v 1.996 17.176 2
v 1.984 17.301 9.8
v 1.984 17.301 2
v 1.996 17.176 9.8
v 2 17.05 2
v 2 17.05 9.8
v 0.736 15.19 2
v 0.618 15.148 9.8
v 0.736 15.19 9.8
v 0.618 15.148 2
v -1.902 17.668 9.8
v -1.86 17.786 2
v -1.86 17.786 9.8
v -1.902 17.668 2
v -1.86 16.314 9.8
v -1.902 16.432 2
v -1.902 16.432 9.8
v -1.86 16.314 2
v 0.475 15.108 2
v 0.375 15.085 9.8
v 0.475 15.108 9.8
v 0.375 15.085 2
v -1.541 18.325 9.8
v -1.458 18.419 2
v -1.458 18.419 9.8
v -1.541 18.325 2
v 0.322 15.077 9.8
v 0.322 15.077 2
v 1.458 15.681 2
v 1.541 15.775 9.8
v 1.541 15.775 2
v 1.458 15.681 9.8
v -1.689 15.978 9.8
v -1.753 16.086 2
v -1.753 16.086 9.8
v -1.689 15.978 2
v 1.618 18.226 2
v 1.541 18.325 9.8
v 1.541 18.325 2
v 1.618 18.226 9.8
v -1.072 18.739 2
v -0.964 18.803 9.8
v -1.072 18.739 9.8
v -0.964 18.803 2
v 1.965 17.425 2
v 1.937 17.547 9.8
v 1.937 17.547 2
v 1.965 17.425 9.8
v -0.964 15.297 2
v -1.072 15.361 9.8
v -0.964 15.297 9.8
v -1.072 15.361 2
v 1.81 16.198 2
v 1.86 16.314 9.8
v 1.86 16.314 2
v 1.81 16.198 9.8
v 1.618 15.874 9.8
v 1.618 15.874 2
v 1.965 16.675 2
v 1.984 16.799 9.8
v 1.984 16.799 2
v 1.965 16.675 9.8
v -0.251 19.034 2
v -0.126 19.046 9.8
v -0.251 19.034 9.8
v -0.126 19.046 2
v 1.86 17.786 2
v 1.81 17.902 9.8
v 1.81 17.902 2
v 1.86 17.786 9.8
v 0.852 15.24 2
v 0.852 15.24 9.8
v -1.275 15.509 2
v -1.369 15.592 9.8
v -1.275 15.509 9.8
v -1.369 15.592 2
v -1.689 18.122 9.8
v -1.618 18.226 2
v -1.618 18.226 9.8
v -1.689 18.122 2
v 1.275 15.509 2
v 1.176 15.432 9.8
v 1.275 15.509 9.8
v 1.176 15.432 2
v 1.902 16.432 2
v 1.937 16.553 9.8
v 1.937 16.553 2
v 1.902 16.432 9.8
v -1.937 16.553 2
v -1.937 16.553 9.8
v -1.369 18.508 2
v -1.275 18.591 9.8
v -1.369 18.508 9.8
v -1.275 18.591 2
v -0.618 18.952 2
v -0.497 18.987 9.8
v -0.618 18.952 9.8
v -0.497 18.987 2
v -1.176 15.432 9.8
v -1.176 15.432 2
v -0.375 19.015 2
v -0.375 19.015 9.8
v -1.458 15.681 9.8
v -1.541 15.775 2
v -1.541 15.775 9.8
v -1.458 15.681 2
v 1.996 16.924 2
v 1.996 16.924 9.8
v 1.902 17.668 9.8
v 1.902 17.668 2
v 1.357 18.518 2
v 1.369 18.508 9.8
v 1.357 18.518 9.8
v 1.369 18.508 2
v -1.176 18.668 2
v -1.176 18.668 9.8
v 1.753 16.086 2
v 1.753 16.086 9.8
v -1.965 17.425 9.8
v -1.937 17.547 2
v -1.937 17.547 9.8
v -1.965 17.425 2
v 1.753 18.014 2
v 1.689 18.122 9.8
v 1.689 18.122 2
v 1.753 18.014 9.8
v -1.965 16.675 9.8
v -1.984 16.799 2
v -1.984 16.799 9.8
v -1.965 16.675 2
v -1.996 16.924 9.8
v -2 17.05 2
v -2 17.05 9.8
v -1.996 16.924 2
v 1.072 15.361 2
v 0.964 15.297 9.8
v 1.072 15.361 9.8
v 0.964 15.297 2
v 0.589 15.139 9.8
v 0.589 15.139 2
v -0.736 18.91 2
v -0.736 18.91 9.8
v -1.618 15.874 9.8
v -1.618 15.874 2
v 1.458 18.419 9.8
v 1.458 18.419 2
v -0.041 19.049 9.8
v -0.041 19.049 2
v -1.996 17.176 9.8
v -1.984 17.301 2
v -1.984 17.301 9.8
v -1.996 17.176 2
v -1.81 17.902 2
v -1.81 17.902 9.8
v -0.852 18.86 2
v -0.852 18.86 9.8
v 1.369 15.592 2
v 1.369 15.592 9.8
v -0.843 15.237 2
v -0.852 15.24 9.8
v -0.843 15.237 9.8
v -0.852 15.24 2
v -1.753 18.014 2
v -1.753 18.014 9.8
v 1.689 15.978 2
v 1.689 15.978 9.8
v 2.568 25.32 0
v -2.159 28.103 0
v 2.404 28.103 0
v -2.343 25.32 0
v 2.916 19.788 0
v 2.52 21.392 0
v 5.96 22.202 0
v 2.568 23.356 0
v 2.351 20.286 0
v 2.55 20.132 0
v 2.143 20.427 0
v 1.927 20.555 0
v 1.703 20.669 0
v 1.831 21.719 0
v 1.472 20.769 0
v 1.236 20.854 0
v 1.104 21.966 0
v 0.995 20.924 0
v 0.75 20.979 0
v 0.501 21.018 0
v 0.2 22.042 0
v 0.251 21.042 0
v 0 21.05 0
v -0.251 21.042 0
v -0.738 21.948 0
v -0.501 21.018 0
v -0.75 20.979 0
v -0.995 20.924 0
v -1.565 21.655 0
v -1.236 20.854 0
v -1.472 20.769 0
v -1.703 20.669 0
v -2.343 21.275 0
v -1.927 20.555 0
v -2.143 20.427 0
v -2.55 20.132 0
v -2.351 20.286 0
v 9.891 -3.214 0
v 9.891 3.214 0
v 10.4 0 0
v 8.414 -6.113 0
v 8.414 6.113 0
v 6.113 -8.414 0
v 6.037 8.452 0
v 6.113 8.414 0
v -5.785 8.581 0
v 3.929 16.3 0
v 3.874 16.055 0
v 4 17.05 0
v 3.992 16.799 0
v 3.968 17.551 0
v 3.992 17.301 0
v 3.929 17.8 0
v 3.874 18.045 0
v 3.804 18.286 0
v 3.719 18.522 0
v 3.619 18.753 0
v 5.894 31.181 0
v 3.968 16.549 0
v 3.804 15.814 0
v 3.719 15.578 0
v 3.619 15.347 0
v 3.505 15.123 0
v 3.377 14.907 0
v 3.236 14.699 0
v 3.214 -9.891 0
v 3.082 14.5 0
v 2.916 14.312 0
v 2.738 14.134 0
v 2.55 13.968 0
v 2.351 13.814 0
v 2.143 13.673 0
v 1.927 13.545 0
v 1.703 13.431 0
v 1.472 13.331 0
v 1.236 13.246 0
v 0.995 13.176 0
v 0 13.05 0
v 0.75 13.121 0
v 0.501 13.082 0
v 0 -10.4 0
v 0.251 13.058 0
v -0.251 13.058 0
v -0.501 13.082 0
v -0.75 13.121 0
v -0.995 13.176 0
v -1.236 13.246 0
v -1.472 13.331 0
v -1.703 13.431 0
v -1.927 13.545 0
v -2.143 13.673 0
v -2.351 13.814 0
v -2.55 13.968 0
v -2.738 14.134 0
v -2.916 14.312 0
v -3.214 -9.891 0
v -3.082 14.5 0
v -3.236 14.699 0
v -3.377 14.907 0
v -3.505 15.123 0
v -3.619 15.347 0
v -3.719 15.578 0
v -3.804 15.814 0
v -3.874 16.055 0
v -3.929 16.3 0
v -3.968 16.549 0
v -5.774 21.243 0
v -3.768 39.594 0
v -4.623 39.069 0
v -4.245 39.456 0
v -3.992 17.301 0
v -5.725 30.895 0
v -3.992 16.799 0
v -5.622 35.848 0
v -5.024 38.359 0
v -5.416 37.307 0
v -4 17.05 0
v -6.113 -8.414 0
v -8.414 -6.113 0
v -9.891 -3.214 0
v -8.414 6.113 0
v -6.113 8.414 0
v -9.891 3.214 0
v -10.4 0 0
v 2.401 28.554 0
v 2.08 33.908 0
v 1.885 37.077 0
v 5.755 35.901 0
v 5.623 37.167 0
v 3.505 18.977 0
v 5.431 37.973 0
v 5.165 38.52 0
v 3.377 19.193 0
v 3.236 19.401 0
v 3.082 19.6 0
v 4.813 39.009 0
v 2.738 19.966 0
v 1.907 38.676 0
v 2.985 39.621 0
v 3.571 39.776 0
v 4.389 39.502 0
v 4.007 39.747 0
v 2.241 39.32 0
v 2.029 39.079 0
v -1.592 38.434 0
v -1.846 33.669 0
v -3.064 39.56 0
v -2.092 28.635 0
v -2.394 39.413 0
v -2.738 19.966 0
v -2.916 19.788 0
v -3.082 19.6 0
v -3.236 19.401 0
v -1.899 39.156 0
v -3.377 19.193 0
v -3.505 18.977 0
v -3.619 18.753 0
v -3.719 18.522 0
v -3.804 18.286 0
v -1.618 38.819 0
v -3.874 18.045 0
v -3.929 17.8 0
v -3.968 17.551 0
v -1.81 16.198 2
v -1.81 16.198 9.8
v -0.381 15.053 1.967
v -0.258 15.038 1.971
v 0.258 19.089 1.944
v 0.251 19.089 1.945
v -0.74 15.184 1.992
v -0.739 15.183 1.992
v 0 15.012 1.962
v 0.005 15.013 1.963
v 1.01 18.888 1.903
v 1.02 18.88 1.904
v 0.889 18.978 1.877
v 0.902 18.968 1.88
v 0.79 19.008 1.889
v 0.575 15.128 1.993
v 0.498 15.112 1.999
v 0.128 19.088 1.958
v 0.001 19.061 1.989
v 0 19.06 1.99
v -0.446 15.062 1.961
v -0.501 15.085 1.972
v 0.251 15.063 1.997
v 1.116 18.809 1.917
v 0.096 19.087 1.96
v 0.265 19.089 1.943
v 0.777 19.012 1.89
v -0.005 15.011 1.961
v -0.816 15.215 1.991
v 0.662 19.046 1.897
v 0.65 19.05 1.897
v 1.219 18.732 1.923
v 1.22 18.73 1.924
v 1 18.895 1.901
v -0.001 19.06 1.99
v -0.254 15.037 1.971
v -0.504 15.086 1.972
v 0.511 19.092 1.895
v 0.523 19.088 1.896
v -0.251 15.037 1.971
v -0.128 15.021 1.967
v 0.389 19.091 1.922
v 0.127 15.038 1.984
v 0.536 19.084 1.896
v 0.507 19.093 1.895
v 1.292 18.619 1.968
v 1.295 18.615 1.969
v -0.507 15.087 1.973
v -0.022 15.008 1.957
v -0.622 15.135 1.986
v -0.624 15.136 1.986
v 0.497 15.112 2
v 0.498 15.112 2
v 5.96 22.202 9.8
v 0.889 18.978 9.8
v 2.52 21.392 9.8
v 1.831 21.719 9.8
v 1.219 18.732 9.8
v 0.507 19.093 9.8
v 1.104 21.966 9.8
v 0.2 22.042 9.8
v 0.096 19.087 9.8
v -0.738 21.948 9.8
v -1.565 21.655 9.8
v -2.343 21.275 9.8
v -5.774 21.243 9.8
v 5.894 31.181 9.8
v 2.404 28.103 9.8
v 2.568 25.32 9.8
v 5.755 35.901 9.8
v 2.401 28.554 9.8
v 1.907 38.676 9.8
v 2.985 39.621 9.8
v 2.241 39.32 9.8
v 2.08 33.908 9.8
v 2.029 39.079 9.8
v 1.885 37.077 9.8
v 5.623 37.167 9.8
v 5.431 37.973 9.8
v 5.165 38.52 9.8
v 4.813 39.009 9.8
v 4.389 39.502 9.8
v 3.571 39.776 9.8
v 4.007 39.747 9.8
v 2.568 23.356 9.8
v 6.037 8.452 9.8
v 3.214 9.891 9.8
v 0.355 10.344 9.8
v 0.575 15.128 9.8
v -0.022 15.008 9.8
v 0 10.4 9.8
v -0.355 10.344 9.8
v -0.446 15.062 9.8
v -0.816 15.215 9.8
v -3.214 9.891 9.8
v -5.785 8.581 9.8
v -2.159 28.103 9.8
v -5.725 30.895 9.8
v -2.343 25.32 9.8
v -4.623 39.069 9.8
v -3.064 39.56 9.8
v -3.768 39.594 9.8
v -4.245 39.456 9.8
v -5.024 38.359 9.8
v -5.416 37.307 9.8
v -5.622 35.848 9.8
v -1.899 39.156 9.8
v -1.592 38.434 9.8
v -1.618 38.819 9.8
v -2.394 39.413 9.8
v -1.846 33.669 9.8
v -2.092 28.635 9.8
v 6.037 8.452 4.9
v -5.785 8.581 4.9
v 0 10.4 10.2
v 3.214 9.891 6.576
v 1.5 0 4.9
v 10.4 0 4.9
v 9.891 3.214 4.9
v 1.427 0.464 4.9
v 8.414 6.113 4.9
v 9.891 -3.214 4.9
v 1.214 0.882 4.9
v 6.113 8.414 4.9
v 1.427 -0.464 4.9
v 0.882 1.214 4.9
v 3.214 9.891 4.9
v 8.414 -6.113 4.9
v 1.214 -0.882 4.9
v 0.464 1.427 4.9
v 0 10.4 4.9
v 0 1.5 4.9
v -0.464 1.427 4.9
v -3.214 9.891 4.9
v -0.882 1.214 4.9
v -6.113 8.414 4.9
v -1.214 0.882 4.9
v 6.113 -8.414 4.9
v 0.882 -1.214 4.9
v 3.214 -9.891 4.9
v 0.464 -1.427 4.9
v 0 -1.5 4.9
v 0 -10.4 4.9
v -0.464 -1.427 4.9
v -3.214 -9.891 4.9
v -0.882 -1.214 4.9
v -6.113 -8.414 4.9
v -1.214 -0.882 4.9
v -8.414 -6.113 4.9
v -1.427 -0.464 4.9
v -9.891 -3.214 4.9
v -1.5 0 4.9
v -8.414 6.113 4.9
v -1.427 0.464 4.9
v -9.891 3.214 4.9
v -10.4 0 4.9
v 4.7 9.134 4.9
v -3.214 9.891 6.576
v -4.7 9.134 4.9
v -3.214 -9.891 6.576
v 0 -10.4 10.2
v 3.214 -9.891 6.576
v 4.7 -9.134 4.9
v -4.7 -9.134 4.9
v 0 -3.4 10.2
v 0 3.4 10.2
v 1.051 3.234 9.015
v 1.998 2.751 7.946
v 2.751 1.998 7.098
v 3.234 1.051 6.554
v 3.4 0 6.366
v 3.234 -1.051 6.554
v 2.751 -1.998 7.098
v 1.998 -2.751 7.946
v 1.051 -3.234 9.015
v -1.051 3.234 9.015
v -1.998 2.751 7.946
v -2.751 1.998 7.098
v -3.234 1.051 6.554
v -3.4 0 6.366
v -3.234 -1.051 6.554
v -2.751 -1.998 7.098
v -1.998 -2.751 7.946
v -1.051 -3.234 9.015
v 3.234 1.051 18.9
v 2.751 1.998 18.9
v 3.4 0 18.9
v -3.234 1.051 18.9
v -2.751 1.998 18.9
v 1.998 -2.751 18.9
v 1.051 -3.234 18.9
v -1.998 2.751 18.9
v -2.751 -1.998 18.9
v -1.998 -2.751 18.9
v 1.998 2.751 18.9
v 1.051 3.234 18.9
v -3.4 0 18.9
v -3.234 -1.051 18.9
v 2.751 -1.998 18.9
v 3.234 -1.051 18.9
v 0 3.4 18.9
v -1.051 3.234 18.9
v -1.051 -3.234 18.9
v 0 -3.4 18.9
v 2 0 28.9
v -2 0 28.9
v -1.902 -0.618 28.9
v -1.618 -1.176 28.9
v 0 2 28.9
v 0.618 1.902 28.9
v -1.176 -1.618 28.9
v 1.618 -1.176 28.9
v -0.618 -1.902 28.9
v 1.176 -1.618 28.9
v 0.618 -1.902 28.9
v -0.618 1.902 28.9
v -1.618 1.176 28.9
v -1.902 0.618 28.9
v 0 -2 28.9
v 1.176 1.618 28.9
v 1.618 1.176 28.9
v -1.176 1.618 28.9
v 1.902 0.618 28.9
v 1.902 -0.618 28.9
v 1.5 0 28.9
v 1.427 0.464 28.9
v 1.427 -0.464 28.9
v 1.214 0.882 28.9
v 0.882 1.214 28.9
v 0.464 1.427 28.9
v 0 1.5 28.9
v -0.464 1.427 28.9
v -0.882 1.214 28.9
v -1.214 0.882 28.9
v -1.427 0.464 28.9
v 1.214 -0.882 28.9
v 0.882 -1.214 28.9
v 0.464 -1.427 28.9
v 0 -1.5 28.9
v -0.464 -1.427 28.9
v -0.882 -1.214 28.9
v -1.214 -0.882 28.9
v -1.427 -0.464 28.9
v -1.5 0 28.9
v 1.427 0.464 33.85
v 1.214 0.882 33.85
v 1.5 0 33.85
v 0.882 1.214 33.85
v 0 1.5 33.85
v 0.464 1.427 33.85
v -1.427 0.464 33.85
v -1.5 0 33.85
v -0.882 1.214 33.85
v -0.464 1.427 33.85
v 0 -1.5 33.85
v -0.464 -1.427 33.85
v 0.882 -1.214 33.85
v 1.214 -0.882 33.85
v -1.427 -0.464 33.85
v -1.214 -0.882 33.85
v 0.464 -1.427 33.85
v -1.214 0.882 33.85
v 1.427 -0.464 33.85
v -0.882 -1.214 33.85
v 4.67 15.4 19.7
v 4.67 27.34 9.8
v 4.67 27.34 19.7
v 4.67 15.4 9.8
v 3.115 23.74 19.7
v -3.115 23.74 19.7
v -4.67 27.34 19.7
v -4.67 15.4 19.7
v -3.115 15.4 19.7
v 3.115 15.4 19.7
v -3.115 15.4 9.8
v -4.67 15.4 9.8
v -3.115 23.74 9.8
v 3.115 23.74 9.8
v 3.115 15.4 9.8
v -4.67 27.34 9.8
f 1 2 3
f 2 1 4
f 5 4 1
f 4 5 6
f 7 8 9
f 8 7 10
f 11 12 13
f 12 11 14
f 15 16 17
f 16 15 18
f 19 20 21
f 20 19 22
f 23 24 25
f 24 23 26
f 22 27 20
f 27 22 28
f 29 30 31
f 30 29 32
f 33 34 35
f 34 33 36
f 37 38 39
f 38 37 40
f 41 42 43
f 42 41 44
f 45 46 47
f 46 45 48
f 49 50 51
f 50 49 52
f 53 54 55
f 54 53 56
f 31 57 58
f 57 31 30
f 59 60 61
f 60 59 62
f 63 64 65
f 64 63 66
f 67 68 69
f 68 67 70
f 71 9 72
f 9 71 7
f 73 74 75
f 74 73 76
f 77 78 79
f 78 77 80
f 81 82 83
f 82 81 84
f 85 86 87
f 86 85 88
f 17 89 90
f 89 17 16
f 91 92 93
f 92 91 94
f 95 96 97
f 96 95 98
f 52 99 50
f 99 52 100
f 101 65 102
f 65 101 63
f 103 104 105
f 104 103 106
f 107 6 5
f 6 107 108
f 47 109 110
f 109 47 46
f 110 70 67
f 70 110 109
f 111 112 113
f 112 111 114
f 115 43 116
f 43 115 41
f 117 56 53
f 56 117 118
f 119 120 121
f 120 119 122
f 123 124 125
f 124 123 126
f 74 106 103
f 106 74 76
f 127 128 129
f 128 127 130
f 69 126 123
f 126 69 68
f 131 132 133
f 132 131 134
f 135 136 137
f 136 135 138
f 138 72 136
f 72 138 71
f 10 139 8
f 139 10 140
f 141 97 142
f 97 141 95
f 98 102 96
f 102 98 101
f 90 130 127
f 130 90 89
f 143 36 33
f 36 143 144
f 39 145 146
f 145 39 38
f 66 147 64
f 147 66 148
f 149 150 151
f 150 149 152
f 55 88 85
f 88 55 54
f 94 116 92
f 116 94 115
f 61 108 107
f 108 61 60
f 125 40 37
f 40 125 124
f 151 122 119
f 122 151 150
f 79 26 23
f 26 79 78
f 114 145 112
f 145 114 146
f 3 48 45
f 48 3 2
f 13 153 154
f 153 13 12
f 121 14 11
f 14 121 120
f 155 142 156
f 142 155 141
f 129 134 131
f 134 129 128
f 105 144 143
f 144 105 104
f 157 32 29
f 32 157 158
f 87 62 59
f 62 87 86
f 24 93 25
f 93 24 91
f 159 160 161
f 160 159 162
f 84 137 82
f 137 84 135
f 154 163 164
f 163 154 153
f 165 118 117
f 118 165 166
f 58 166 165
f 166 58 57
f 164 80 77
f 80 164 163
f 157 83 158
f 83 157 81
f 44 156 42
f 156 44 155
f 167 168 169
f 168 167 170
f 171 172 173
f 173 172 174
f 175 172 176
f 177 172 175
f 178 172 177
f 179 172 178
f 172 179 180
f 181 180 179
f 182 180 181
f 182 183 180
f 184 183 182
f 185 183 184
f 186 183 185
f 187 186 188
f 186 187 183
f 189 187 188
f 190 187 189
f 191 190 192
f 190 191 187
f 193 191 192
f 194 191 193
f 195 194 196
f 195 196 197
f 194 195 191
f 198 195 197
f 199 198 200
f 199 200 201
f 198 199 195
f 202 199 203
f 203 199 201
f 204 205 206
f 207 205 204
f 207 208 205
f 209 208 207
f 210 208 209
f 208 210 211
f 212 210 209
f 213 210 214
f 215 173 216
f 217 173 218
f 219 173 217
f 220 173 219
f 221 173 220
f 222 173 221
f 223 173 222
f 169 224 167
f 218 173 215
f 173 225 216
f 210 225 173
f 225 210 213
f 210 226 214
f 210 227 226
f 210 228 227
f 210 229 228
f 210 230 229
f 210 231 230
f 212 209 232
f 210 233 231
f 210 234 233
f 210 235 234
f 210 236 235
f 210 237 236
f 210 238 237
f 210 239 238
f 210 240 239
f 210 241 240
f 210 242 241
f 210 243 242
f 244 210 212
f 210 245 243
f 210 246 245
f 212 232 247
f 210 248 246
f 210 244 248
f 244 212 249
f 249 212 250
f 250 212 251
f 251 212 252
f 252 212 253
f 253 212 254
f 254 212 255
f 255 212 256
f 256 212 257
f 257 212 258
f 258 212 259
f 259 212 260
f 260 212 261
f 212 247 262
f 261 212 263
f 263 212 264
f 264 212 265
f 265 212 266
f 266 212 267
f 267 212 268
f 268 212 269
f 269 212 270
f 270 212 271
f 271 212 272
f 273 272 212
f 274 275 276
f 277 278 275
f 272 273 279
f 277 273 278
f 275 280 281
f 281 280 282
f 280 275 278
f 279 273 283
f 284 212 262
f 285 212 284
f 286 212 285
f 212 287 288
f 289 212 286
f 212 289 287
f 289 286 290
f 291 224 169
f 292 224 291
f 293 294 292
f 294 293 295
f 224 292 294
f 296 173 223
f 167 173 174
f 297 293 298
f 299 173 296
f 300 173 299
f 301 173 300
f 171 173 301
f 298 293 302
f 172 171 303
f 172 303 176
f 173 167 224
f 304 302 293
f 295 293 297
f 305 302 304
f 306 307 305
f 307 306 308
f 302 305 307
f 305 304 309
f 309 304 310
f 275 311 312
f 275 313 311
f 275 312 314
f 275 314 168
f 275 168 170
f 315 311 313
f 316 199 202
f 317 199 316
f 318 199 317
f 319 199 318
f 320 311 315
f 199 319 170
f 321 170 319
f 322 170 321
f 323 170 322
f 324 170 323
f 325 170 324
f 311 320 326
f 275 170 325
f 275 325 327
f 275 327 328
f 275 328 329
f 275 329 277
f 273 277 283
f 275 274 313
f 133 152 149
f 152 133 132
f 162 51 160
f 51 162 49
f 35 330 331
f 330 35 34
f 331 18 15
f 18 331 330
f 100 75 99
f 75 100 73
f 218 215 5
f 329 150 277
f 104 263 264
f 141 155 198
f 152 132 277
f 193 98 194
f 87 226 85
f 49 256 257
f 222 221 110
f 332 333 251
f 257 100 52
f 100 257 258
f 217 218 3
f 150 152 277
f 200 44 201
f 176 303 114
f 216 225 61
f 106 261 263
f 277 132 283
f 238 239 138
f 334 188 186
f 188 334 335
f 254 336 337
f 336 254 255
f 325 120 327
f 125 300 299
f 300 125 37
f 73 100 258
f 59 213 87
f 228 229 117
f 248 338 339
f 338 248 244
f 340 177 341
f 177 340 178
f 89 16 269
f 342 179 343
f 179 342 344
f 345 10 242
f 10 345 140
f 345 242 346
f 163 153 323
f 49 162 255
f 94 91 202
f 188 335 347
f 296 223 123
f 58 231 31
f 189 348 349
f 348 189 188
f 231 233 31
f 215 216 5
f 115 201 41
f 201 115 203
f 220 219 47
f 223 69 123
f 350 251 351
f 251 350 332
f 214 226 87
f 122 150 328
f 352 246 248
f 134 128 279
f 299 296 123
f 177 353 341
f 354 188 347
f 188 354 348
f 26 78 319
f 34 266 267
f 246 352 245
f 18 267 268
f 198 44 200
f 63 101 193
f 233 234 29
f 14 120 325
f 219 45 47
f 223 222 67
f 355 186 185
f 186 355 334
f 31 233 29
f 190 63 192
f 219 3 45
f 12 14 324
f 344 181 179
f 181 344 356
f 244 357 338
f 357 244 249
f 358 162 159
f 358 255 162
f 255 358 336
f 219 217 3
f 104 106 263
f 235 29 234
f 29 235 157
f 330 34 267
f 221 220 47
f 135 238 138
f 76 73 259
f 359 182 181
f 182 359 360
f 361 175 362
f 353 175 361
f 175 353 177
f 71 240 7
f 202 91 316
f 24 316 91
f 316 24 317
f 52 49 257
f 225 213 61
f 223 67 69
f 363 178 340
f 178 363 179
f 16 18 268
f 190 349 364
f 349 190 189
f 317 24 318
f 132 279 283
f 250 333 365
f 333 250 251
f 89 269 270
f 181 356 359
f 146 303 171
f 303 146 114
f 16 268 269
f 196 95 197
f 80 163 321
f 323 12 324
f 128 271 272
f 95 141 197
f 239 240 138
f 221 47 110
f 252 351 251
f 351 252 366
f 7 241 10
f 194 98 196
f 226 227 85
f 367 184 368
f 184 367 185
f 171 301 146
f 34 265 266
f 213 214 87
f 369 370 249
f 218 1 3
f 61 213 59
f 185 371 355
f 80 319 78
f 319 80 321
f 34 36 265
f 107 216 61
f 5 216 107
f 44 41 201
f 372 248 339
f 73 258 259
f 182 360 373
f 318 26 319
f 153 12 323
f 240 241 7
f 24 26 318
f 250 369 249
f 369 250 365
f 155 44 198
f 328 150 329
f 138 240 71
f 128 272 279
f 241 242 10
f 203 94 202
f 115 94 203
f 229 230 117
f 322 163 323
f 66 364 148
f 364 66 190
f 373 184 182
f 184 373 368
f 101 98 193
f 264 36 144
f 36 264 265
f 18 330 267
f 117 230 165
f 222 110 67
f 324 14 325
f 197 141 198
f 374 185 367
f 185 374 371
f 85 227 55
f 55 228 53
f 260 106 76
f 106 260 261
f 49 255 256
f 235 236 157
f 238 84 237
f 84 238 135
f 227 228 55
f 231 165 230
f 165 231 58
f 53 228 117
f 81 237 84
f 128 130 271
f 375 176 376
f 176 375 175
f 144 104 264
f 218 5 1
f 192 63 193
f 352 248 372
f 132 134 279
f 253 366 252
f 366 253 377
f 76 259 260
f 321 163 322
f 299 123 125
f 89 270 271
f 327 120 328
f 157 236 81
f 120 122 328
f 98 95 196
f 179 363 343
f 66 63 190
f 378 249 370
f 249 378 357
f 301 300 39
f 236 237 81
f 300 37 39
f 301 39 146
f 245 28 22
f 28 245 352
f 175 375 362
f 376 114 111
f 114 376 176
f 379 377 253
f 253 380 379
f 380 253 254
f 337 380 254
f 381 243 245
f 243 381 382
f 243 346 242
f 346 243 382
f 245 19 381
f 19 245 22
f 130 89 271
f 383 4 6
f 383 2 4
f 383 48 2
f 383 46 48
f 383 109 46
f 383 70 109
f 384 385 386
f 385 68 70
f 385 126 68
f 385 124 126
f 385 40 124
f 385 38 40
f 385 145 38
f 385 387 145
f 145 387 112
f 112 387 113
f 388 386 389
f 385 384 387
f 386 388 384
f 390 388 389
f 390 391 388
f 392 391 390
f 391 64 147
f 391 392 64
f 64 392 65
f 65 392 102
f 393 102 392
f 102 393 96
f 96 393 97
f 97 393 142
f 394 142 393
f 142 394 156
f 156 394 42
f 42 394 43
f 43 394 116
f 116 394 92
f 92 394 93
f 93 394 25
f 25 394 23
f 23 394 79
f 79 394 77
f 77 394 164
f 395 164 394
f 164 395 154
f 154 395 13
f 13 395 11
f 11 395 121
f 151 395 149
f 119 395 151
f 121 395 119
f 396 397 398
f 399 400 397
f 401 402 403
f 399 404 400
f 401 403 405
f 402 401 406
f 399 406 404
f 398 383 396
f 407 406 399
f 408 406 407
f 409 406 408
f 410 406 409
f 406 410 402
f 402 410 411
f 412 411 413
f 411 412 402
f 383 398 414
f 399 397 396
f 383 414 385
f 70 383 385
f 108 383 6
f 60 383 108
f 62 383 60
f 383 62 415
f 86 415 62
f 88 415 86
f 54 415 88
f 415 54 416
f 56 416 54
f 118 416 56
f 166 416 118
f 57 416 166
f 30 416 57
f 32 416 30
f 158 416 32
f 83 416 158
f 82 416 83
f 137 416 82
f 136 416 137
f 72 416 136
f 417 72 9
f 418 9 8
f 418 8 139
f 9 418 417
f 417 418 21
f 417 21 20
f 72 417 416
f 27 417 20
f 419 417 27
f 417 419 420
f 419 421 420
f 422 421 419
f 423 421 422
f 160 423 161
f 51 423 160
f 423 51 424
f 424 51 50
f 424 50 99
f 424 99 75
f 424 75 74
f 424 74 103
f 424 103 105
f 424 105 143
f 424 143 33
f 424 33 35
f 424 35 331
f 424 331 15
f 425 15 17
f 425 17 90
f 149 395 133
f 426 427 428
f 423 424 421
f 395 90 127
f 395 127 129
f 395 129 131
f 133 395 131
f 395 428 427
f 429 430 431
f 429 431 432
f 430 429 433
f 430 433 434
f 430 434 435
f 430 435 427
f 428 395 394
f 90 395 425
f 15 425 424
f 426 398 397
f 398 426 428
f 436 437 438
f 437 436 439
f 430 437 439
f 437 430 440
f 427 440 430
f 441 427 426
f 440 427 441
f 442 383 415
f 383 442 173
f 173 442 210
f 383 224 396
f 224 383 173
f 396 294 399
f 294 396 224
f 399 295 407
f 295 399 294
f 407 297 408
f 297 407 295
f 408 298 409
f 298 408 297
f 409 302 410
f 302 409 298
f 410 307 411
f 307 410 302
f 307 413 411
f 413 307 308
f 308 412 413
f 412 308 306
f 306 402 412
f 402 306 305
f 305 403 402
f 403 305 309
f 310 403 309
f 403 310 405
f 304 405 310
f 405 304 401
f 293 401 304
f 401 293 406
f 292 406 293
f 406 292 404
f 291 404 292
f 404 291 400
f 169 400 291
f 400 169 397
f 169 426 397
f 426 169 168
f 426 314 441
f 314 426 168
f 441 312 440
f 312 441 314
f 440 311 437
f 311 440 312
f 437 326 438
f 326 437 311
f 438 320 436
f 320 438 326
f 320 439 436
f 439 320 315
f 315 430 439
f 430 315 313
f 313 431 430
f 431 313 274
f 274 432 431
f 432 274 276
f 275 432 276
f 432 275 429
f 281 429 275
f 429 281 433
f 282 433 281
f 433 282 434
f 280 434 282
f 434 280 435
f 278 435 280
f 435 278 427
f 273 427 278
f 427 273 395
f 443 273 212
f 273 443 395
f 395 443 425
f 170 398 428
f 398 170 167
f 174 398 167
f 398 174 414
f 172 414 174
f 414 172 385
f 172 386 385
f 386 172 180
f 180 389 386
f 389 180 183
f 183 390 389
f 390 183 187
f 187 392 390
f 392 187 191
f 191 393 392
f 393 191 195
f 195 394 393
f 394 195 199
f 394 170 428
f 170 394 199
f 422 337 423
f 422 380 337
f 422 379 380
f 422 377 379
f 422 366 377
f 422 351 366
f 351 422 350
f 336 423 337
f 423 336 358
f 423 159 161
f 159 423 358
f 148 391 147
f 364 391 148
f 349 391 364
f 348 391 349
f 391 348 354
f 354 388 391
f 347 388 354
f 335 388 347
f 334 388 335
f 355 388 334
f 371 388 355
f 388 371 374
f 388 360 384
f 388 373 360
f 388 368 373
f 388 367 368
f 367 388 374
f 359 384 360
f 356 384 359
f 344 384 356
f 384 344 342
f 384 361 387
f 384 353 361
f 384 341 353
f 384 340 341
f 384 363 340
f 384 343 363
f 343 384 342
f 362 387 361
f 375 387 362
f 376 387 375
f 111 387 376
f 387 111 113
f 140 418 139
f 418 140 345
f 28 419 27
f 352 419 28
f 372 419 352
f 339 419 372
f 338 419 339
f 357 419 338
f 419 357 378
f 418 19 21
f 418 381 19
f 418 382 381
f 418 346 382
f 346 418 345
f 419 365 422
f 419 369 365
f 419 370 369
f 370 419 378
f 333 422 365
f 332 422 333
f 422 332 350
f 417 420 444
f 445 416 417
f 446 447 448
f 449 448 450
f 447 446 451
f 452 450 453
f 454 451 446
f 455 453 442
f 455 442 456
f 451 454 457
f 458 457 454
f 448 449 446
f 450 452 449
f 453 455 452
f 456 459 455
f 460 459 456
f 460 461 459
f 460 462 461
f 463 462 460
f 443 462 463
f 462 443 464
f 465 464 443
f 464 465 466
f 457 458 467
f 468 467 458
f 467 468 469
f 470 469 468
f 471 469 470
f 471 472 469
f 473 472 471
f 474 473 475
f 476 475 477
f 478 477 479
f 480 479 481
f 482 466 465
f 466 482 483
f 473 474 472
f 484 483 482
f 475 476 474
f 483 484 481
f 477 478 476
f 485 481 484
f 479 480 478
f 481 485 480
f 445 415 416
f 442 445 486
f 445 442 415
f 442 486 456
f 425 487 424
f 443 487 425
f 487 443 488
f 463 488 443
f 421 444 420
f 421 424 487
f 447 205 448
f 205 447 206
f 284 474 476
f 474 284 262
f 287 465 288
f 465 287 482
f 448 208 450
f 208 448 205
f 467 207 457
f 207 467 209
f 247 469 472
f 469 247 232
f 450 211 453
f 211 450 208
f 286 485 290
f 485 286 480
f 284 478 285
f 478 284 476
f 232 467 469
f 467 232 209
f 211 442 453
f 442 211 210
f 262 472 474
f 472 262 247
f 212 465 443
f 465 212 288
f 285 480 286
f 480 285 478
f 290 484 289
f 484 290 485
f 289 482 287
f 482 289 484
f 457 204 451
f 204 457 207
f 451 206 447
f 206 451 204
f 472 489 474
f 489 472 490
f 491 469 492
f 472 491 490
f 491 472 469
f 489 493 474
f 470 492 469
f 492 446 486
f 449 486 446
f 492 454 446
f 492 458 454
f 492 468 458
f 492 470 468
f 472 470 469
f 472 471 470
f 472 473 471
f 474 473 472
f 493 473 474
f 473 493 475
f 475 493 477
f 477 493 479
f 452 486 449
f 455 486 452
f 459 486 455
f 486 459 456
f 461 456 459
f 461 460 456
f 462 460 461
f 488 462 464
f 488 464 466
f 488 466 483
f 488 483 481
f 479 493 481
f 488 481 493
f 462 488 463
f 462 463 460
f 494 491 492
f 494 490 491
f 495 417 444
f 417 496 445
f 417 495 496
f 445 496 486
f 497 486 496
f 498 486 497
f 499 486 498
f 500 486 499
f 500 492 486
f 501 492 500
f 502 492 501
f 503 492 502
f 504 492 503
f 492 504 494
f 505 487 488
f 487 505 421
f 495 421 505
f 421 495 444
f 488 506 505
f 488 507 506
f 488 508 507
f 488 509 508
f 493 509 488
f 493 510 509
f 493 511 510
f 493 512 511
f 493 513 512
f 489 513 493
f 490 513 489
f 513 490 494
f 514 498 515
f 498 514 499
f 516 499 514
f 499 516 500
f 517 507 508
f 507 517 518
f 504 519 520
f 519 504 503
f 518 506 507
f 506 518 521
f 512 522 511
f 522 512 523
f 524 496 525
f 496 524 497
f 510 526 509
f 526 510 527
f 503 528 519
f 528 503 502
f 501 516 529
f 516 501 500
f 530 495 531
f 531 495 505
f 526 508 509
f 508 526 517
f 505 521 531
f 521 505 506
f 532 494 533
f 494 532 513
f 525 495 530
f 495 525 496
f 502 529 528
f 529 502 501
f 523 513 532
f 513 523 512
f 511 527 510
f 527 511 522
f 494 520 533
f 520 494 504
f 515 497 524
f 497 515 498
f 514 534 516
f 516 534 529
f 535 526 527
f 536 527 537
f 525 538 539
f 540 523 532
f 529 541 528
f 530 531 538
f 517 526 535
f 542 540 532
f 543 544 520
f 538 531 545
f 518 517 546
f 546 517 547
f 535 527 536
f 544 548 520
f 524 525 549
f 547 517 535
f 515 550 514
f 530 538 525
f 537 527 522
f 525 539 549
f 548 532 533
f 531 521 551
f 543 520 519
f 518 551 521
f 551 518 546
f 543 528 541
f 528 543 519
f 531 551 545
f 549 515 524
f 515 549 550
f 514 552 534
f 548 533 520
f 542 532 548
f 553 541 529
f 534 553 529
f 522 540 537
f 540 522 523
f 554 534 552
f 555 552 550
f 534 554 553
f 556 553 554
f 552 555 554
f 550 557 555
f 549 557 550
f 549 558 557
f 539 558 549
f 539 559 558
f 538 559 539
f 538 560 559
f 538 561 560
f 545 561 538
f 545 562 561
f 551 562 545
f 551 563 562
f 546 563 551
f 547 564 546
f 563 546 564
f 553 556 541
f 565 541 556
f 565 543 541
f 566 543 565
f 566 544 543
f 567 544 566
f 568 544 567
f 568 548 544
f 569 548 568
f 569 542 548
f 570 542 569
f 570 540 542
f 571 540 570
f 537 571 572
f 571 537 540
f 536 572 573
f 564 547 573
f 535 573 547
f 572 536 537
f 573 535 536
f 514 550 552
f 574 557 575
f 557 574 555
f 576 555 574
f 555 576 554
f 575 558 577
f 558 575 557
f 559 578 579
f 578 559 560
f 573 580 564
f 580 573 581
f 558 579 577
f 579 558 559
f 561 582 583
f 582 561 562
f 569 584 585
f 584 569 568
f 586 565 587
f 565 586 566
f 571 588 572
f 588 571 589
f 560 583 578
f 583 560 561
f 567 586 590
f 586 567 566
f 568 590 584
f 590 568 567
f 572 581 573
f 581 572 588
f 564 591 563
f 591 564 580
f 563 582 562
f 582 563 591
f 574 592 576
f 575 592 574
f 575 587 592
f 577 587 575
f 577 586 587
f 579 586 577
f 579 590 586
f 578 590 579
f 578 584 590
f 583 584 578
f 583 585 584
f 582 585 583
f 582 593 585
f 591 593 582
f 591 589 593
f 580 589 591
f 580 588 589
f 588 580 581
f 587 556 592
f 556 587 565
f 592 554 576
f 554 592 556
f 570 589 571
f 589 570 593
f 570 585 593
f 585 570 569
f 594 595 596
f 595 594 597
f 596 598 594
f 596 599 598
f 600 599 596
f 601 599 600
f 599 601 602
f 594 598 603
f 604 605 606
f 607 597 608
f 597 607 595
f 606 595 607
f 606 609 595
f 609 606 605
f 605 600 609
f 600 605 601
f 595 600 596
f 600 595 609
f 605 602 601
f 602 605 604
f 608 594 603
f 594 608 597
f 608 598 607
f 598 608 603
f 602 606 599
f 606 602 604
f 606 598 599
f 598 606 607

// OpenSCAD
detail = 20;
marge = 0.5;
hauteur_socle = 9.8;
hauteur_cylindre_base = 4.9;
rayon_cylindre_base = 10.4;
hauteur_cylindre_haut = 14;
rayon_cylindre_haut = 3.4;
rayon_cylindre_creux = 5;
rayon_mini_cylindre = 1.5;
hauteur_mini_cylindre = 33.85;
rayon_cone = 2;
hauteur_cone = 10;
cote_triangle = 9.4;
hauteur_triangle = 5.3;
largeur_cube = 9.34;
longueur_cube = 11.94;
hauteur_cube = 9.9;
largeur_cube_inner = 6.23;
longueur_cube_inner = 8.34;


module cylindre_creux(){
	difference(){
		cylinder(h=100, r=2*rayon_cylindre_base, $fn=detail, center=true);
		cylinder(h=100, r=rayon_cylindre_base, $fn=detail, center=true);
	}
}

module vis(){
	cylinder (r1=2, r2=2, h=20, $fn=100);
	cylinder (r1=4, r2=2, h=2, $fn=100);
}

module socle(){
	translate([0,0,(hauteur_cylindre_base/2)]) color("blue") cylinder(h=hauteur_cylindre_base, r=rayon_cylindre_base, $fn=detail, center=true);
	difference(){
		translate([-10.2,-10.2,0]) linear_extrude(height=hauteur_socle) scale([0.58,0.58,1]) import("piece_enguerran_nb.dxf");
		translate([0,0,((3*hauteur_cylindre_base+marge)/2)]) color("blue") cylinder(h=hauteur_cylindre_base+marge, r=rayon_cylindre_base, $fn=detail, center=true);
		translate([0,17.05,0]) color("pink") vis();
	}
}

module trapeze(){
	difference(){
		translate([-cote_triangle/2,0,0]) rotate([90,0,0]) linear_extrude(height=2*rayon_cylindre_base, center=true) polygon(points=[[0,0],[cote_triangle,0],[cote_triangle/2,hauteur_triangle]], paths=[[0,1,2]]);
		cylindre_creux();
	}
}

module pointe(){
	translate([0,0,(hauteur_cylindre_base)]) cylinder(h=hauteur_cylindre_haut, r=rayon_cylindre_haut, $fn=detail, center=true);
	translate([0,0,(hauteur_cylindre_base + hauteur_cylindre_haut/2 + hauteur_cone/2)]) color("red") cylinder(h=hauteur_cone, r1=rayon_cylindre_haut, r2=rayon_cone, $fn=detail, center=true);
	translate([0,0,(hauteur_mini_cylindre-hauteur_cylindre_haut)/2]) color("green") cylinder(h=hauteur_mini_cylindre, r=rayon_mini_cylindre, $fn=detail, center=true);
}

socle();
translate([0,0,hauteur_cylindre_base]) trapeze();
translate([0,0,hauteur_cylindre_haut/2]) pointe();

translate([0,5+rayon_cylindre_base,hauteur_socle+hauteur_cube/2]) 
difference(){
	translate([0,longueur_cube/2,0]) cube([largeur_cube,longueur_cube,hauteur_cube], center=true);
	translate([0,longueur_cube_inner/2,0]) cube([largeur_cube_inner,longueur_cube_inner,hauteur_cube], center=true);
}
